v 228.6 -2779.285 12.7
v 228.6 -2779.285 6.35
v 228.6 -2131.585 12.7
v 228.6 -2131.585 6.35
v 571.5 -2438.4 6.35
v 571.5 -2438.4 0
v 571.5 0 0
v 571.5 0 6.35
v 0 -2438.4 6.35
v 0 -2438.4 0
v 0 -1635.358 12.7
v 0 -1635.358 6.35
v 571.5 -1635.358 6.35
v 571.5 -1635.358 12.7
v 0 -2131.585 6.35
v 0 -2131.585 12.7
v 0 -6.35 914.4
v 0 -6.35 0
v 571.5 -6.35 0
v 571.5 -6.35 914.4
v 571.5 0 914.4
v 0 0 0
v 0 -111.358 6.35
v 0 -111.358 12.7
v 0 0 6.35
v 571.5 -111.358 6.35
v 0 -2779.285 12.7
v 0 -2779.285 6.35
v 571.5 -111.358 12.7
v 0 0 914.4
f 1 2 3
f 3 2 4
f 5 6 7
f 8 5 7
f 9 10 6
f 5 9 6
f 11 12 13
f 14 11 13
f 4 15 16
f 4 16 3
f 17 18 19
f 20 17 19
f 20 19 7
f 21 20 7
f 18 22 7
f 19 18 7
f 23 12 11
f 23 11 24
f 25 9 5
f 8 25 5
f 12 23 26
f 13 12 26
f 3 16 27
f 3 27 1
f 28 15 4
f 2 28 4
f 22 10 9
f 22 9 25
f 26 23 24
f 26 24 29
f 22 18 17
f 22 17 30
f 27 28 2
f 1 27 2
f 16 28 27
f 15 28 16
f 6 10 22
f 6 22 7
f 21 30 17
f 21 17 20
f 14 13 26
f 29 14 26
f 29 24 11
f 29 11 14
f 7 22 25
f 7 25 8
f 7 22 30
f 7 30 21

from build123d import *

# Parameters (mm, degrees)
F0_W     = 571.5
F0_H     = 2438.4
F1_DEPTH = 6.35
F2_W     = 571.5
F2_H     = 6.35
F3_DEPTH = 914.4
F4_W     = 228.6
F4_H     = 647.7
F5_DEPTH = 6.35
F6_W     = 571.5
F6_H     = 1524
F7_DEPTH = 6.35


# Not quite as in the source:
# - a length typed as a fraction of an inch, garbled in the dataset ("3 / 203.2 mm" for 3/8 in), is restored


with BuildPart() as f1:
    # F0 (on Top) → F1 (new body)
    with BuildSketch(Plane.XY):
        with Locations((285.75, -1219.2)):
            Rectangle(F0_W, F0_H)
    extrude(amount=F1_DEPTH)


with BuildPart() as f3:
    # F2 (on Top) → F3 (new body)
    with BuildSketch(Plane.XY):
        with Locations((285.75, -3.175)):
            Rectangle(F2_W, F2_H)
    extrude(amount=F3_DEPTH)


with BuildPart() as f5:
    # F4 (on face) → F5 (new body)
    with BuildSketch(Plane.XY.offset(6.35)):
        with Locations((114.3, -2455.4346443176)):
            Rectangle(F4_W, F4_H)
    extrude(amount=F5_DEPTH)


with BuildPart() as f7:
    # F6 (on face) → F7 (new body)
    with BuildSketch(Plane.XY.offset(6.35)):
        with Locations((285.75, -873.3578567505)):
            Rectangle(F6_W, F6_H)
    extrude(amount=F7_DEPTH)


solid = Compound([f1.part, f3.part, f5.part, f7.part])
